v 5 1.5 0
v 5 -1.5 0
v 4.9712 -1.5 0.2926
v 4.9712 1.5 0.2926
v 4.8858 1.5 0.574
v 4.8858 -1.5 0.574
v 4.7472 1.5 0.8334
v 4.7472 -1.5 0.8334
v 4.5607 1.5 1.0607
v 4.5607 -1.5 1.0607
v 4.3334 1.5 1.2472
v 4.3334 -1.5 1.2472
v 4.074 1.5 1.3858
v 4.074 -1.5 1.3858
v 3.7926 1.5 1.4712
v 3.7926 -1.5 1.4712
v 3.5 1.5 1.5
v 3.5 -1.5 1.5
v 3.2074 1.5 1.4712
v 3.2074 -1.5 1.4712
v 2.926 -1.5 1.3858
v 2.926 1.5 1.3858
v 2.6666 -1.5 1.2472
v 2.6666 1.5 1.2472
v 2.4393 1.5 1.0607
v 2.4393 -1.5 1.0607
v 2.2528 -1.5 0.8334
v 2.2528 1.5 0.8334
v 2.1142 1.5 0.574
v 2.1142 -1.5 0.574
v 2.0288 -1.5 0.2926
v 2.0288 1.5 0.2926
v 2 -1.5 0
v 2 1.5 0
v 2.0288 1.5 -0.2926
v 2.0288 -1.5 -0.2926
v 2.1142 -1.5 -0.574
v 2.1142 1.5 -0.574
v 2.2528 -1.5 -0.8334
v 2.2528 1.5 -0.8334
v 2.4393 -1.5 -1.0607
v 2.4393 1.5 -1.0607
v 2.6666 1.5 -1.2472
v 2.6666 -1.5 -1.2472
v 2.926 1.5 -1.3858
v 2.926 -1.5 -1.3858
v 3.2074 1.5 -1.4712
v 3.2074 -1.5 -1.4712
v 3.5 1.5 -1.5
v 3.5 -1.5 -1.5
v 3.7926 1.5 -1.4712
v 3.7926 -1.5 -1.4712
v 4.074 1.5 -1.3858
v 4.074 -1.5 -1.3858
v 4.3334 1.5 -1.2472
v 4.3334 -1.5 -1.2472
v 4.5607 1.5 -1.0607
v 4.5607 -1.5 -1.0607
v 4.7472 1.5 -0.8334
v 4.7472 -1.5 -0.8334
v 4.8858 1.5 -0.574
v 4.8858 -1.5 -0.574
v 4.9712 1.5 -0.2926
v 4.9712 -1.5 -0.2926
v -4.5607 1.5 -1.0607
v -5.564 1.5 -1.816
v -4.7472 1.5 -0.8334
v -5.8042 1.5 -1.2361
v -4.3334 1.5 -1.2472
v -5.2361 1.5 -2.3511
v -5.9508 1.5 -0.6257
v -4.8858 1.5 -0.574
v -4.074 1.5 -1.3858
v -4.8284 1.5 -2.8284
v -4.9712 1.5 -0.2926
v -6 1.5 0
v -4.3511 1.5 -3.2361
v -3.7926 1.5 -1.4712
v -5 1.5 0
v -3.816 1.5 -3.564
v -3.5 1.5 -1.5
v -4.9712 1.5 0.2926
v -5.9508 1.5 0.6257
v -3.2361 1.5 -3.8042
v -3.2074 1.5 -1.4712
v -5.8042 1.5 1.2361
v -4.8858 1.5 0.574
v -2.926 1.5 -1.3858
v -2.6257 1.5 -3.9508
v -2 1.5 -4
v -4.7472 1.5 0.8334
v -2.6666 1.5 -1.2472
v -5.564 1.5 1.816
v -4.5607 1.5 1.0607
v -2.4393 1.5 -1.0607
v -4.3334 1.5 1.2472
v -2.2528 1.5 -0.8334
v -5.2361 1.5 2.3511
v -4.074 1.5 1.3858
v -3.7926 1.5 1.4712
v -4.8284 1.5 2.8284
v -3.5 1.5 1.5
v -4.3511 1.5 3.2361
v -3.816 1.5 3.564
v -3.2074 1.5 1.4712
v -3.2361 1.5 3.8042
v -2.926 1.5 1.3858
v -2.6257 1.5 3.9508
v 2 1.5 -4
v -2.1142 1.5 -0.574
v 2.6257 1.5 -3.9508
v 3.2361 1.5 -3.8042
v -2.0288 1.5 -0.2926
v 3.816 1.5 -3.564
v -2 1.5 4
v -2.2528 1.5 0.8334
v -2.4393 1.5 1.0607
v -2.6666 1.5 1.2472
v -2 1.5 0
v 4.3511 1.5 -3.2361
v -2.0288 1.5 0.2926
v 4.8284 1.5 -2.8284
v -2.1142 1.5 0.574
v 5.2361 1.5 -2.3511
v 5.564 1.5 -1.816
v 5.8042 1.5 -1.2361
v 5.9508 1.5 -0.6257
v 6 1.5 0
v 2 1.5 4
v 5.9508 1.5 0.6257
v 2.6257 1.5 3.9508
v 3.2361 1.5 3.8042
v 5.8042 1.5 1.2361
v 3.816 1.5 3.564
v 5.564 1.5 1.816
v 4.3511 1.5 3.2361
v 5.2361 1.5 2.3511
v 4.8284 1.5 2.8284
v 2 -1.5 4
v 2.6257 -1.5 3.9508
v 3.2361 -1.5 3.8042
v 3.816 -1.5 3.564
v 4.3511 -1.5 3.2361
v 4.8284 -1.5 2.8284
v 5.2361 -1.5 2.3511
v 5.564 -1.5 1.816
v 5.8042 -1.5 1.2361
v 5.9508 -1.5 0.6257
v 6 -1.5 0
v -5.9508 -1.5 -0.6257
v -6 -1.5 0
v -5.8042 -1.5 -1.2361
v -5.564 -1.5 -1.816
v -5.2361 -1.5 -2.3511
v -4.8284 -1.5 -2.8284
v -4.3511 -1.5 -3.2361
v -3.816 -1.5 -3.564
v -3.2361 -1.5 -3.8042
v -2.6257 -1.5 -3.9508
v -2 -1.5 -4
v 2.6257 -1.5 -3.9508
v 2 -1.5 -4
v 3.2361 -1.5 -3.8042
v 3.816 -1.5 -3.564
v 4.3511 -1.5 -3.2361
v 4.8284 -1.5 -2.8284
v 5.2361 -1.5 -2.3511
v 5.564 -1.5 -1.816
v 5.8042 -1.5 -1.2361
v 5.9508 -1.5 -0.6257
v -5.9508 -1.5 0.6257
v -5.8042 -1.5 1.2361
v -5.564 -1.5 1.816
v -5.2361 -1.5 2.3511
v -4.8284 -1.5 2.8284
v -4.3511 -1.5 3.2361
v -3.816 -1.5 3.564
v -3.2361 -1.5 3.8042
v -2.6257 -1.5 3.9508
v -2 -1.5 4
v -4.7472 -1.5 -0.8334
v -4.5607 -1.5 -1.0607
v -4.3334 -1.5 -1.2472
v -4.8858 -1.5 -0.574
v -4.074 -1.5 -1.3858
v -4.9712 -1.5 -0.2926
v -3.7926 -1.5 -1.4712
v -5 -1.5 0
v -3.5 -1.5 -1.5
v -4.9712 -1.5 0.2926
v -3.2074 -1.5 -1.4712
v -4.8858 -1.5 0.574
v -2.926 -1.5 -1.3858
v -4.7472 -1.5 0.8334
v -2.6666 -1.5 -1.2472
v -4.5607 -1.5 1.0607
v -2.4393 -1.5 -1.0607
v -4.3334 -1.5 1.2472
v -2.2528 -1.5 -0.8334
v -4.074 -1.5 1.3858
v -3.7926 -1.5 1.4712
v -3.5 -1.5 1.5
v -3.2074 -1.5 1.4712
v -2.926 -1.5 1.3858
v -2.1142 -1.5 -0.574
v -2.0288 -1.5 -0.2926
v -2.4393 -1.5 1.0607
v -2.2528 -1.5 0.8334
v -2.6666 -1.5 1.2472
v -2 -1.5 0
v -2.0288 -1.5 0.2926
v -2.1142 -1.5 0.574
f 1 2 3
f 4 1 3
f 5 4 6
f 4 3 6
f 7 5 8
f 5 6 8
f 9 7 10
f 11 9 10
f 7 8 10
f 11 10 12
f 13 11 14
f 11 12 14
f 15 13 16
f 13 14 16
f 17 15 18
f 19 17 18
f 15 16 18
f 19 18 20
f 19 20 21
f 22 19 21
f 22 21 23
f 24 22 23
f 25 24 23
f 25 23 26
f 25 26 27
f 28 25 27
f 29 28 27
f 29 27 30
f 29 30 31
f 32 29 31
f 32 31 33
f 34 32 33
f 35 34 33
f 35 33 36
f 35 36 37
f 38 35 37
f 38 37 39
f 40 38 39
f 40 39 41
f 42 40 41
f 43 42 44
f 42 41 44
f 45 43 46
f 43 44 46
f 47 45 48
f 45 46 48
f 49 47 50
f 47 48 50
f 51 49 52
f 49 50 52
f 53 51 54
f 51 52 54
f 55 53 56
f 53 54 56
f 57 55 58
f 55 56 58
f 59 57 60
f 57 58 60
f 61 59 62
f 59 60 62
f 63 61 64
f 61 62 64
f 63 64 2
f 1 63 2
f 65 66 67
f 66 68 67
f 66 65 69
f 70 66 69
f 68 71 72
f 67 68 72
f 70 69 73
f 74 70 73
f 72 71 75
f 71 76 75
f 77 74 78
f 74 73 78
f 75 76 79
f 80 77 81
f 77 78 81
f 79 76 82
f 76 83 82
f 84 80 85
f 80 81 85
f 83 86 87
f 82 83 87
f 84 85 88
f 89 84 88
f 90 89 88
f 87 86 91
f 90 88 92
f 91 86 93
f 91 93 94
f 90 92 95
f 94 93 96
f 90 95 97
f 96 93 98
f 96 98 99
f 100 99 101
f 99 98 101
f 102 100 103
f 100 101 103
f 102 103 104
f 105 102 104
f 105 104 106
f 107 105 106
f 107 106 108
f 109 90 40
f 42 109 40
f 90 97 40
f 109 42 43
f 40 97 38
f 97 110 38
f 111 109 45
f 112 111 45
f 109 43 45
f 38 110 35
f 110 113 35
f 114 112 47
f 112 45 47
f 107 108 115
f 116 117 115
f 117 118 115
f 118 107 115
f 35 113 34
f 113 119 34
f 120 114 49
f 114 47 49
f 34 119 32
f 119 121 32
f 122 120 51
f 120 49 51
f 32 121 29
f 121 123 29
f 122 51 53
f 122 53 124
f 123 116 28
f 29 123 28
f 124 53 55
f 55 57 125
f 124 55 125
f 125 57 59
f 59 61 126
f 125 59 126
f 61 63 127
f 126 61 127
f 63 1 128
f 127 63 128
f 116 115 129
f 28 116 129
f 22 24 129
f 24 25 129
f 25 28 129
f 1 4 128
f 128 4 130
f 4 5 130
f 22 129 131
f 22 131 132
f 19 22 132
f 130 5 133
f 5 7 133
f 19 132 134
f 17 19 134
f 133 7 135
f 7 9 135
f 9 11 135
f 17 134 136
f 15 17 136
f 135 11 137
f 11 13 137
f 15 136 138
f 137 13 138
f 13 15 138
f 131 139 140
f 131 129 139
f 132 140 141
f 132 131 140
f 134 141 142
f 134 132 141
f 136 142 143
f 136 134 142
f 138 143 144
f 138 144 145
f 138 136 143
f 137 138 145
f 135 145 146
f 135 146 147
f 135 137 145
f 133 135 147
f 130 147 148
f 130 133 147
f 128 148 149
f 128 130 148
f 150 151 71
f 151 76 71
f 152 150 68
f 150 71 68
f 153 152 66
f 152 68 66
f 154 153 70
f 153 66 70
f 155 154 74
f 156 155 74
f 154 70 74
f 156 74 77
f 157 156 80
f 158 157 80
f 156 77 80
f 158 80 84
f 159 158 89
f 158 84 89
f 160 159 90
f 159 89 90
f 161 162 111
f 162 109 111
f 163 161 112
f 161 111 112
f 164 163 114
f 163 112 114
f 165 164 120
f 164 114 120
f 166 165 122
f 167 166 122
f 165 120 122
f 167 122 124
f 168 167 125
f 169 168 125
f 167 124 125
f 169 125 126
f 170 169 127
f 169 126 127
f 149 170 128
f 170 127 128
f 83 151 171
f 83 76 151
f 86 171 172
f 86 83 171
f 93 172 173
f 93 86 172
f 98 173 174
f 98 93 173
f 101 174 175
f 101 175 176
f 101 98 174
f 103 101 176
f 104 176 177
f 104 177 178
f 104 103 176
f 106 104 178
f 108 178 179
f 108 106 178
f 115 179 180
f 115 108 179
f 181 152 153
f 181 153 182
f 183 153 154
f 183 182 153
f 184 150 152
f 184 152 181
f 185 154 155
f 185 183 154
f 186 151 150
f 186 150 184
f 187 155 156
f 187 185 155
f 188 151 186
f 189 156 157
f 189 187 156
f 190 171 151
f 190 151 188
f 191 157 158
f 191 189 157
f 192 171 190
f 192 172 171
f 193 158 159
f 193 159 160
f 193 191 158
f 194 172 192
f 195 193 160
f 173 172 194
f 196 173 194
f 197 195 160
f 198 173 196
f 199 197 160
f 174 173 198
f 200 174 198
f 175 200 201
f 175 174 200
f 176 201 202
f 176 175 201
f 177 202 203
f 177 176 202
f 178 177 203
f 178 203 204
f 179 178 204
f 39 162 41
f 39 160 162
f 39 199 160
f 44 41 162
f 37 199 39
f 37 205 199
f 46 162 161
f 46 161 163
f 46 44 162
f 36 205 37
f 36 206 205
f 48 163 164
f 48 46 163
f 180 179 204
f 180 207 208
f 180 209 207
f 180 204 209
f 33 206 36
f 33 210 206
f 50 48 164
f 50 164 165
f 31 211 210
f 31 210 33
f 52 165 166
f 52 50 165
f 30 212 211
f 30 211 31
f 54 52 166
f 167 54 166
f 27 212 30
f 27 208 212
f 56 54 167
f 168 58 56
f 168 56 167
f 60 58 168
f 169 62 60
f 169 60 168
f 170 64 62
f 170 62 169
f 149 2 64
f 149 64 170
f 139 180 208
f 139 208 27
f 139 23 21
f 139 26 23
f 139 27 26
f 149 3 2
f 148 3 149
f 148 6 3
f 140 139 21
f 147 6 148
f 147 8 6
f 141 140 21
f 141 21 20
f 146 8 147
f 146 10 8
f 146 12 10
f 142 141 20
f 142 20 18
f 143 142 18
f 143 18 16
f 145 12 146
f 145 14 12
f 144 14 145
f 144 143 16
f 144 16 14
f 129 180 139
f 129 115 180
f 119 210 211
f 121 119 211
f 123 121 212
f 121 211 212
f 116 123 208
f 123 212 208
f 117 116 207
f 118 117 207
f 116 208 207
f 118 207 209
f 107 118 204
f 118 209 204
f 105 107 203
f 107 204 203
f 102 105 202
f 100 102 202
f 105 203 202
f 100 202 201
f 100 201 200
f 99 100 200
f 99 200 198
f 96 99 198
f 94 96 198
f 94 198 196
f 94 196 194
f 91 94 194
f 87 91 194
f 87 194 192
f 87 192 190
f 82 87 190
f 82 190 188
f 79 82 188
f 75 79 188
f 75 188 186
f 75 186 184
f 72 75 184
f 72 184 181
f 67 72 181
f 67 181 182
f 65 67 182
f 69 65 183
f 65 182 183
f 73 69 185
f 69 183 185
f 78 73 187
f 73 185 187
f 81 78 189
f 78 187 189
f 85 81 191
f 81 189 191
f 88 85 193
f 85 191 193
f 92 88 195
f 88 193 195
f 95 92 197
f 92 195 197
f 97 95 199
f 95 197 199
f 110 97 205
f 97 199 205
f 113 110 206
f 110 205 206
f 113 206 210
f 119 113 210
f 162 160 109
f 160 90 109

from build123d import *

# Parameters (mm, degrees)
F0_W     = 12
F0_H     = 3
F1_DEPTH = 4
F2_R     = 1.5
F3_DEPTH = 25
F4_R     = 3.99999


# Not quite as in the source:
# - a fillet or chamfer is up to 0.001 mm smaller than in the source, because OpenCascade refuses the exact size


with BuildPart() as f1:
    # F0 (on Top) → F1 (new body, symmetric)
    with BuildSketch(Plane.XY):
        Rectangle(F0_W, F0_H)
    extrude(amount=F1_DEPTH, both=True)

    # F2 (on face) → F3 (cut)
    with BuildSketch(Plane.XZ.offset(1.5)):
        with Locations((-3.5, 0)):
            Circle(F2_R)
        with Locations((3.5, 0)):
            Circle(F2_R)
    extrude(amount=-F3_DEPTH, mode=Mode.SUBTRACT)

    # F4 (radius 4 in the source; OpenCascade refuses exactly that, so slightly less here)
    f4_edges = [f1.edges().sort_by_distance(p)[0] for p in [
        (-6, 0, 4),
        (-6, 0, -4),
        (6, 0, 4),
        (6, 0, -4),
    ]]
    fillet(f4_edges, radius=F4_R)


solid = f1.part
